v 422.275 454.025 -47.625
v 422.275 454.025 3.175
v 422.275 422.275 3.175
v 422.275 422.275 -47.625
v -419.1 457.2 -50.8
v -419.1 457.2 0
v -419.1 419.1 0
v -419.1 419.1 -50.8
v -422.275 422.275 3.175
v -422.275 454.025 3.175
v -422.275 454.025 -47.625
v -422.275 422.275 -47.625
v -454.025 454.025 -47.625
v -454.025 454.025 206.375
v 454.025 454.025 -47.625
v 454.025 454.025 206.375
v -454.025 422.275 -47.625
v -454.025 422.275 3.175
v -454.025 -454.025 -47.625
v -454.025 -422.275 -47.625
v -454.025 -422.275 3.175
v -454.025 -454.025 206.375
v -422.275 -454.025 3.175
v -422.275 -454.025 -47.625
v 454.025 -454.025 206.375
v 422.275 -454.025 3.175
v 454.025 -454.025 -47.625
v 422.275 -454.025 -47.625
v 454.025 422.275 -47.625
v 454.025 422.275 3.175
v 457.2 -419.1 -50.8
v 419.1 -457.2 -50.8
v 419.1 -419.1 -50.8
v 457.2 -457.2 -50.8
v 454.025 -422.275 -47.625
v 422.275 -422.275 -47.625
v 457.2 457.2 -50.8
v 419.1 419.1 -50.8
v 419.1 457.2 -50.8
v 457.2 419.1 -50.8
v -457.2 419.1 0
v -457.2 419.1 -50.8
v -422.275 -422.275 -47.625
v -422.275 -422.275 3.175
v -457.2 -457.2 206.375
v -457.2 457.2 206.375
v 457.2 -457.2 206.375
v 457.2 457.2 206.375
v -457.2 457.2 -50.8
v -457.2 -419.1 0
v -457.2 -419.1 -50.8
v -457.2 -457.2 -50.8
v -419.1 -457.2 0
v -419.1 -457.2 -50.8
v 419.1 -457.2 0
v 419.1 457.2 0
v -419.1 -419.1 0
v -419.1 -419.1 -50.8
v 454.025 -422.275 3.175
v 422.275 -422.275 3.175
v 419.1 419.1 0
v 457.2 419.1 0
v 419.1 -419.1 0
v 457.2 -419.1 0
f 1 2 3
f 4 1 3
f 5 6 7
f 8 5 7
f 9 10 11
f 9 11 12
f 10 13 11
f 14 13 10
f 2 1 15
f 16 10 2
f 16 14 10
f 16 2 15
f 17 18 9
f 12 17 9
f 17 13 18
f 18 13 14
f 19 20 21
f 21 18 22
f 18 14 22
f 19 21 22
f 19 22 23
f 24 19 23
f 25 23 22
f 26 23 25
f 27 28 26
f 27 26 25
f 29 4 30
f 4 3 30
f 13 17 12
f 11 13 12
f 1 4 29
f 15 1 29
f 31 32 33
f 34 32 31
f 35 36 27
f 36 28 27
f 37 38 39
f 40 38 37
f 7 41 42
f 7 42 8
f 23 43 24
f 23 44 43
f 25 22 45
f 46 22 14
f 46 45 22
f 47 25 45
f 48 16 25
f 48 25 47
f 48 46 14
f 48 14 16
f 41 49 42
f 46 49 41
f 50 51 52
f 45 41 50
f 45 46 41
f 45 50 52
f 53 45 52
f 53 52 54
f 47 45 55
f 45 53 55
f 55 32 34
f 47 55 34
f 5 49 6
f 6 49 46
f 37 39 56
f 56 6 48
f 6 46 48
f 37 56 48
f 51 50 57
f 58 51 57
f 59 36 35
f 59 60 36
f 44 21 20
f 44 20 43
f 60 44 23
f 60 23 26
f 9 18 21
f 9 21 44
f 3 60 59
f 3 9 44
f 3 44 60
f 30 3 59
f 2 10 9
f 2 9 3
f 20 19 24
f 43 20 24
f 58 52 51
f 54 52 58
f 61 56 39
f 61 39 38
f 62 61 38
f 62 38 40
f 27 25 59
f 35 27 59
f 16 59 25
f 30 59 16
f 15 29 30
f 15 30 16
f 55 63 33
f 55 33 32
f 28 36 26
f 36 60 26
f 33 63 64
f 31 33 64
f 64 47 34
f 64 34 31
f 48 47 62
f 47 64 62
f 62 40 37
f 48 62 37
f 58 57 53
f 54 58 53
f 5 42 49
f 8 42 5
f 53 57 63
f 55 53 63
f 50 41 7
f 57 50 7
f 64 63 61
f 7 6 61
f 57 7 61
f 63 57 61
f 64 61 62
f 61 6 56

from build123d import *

# Parameters (mm, degrees)
F0_W     = 914.4
F0_H     = 914.4
F1_DEPTH = 3.175
F2_W     = 914.4
F2_H     = 914.4
F2_W_2   = 908.05
F2_H_2   = 908.05
F3_DEPTH = 203.2
F4_W     = 38.1
F4_H     = 38.1
F5_DEPTH = 50.8
F6_T     = -3.175


with BuildPart() as f1:
    # F0 (on Top) → F1 (new body)
    with BuildSketch(Plane.XY):
        Rectangle(F0_W, F0_H)
    extrude(amount=F1_DEPTH)

    # F2 (on face) → F3 (join)
    with BuildSketch(Plane.XY.offset(3.175)):
        Rectangle(F2_W, F2_H)
        Rectangle(F2_W_2, F2_H_2, mode=Mode.SUBTRACT)
        Rectangle(F2_W_2, F2_H_2)
    extrude(amount=F3_DEPTH)

    # F4 (on face) → F5 (join)
    with BuildSketch(Plane(origin=(0, 0, 0), x_dir=(1, 0, 0), z_dir=(0, 0, -1))):
        with Locations((-438.15, -438.15)):
            Rectangle(F4_W, F4_H)
        with Locations((438.15, -438.15)):
            Rectangle(F4_W, F4_H)
        with Locations((438.15, 438.15)):
            Rectangle(F4_W, F4_H)
        with Locations((-438.15, 438.15)):
            Rectangle(F4_W, F4_H)
    extrude(amount=F5_DEPTH)

    # F6
    f6_openings = [f1.faces().sort_by_distance(p)[0] for p in [
        (0, 0, 206.375),
    ]]
    offset(amount=F6_T, openings=f6_openings, kind=Kind.INTERSECTION)


solid = f1.part
